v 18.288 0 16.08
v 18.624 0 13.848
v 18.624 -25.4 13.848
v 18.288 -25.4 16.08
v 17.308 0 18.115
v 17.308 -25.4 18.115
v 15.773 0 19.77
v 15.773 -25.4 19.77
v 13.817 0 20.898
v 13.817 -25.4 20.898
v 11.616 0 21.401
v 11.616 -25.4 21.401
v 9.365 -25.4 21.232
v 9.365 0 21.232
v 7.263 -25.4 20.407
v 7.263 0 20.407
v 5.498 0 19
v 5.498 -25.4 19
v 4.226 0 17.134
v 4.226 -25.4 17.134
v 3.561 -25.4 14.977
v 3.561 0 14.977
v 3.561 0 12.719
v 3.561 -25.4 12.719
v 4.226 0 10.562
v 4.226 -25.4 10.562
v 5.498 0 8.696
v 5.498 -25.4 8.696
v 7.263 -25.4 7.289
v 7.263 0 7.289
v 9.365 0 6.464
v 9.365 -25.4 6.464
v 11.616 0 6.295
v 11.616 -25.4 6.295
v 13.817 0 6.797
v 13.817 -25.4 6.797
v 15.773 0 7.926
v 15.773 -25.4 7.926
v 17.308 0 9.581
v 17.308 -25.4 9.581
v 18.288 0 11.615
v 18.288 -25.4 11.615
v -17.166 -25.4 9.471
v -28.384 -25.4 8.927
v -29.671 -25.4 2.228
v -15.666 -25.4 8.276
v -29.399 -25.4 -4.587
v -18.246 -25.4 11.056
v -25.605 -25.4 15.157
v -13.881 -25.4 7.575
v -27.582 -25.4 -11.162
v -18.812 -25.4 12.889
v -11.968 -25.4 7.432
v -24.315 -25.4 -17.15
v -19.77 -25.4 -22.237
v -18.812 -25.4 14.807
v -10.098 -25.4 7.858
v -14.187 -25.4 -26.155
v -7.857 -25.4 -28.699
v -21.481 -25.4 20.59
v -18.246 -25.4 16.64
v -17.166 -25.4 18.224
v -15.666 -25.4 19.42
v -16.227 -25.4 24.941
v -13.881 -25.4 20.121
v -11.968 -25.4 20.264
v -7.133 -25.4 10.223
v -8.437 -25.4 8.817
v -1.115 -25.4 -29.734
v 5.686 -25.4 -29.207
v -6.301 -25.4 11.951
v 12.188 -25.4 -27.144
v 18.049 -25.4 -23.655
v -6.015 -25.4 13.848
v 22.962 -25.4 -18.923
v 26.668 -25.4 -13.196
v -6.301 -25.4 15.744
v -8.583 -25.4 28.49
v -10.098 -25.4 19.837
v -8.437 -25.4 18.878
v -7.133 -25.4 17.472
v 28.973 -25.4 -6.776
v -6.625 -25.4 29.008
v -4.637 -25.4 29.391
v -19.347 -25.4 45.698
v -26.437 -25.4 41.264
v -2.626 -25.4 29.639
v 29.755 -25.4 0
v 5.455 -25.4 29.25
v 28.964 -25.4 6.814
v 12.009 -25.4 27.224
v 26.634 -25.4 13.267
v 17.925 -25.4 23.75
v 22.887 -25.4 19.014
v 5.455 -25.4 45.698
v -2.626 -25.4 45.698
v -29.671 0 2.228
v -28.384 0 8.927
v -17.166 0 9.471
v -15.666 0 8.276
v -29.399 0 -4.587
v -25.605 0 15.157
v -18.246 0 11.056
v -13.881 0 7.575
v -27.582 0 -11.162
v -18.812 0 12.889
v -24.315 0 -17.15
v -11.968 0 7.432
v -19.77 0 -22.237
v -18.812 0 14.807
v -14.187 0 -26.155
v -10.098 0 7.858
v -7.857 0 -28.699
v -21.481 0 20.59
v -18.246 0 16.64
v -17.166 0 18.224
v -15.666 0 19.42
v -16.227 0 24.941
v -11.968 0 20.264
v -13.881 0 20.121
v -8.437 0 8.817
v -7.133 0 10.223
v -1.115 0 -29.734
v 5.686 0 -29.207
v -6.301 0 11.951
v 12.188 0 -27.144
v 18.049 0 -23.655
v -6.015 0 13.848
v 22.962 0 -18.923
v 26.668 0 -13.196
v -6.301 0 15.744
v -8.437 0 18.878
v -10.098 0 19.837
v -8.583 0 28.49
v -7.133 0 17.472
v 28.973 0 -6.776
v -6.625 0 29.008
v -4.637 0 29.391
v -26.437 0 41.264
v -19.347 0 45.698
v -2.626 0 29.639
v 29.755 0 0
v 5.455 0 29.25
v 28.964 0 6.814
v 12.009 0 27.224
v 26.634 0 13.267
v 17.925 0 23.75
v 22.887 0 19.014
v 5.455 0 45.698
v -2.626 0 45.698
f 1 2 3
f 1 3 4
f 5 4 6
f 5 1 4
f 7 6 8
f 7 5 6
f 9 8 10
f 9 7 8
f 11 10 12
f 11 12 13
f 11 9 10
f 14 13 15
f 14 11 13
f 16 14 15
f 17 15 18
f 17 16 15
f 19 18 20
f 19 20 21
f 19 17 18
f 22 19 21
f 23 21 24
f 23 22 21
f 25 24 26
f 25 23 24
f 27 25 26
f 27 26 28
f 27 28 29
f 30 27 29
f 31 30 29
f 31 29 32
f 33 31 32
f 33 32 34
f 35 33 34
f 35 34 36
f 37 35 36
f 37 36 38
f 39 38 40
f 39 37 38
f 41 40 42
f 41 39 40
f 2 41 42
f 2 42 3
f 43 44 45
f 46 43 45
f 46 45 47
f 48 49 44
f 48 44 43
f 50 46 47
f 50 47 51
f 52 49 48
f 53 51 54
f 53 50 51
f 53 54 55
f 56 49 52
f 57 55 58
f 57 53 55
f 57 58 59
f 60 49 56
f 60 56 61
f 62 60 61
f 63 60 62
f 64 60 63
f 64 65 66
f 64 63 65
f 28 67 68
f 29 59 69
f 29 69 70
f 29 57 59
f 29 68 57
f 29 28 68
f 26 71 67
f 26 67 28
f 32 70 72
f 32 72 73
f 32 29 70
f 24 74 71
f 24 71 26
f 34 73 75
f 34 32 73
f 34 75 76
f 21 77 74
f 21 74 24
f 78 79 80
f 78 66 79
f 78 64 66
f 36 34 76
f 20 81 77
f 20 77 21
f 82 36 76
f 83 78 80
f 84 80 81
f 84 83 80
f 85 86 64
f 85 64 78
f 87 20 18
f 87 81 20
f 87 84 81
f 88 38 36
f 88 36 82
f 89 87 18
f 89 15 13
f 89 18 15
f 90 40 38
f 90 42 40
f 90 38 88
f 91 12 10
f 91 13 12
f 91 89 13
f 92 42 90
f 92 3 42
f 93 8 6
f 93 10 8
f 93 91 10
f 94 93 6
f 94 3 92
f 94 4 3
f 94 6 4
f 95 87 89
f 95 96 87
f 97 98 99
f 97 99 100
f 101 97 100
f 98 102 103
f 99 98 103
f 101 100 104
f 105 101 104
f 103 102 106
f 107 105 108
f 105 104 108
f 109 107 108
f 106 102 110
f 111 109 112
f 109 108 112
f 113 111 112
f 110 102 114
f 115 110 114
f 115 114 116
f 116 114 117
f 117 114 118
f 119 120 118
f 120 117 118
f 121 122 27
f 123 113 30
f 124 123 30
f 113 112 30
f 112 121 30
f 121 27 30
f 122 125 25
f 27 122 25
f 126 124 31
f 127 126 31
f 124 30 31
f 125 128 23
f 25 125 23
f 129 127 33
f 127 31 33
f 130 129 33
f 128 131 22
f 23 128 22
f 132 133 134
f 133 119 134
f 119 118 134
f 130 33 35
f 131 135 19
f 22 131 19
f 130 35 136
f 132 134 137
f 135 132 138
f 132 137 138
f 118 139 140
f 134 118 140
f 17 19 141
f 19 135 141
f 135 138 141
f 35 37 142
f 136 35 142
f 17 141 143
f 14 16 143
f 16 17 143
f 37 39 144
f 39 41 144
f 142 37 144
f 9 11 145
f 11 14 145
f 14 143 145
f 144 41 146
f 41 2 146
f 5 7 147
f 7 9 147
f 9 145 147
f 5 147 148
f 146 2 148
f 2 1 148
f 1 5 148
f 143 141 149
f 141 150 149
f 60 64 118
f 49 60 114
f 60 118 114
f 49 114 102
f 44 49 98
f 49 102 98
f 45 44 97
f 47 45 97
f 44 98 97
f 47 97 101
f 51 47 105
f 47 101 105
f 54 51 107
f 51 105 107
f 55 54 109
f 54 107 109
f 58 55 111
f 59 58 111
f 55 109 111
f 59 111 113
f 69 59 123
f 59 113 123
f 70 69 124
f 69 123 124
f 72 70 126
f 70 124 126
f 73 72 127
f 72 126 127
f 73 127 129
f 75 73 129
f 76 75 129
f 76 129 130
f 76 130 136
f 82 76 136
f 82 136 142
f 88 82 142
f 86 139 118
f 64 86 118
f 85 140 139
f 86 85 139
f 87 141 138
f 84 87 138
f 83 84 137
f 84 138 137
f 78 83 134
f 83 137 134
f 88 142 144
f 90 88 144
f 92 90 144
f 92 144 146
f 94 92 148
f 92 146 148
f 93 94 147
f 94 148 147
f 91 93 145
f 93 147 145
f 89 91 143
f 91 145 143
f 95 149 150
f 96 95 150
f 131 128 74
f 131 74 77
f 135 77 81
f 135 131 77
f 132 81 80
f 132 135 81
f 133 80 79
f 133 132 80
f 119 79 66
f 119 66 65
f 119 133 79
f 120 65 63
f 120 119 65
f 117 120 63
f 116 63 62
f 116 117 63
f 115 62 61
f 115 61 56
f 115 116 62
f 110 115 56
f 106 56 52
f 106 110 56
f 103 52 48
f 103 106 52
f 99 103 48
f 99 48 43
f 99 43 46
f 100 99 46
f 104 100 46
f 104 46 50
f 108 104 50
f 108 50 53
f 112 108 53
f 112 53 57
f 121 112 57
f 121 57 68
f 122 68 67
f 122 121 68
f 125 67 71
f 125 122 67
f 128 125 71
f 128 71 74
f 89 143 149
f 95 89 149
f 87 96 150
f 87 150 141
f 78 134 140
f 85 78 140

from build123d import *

# Parameters (mm, degrees)
F0_R     = 6.434371
F0_R_2   = 7.574086
F1_DEPTH = 25.4
F2_W     = 3.636818
F2_H     = 3.357063
F2_W_2   = 13.428252
F2_W_3   = 5.315348
F3_DEPTH = 25.4


with BuildPart() as f1:
    # F0 (on Front) → F1 (new body)
    with BuildSketch(Plane.XZ):
        with BuildLine():
            ThreePointArc((-16.227132, 24.940537), (-14.186517, -26.15517), (29.754834, 0))
            ThreePointArc((29.754834, 0), (22.887437, 19.013558), (5.455228, 29.250481))
            ThreePointArc((5.455228, 29.250481), (1.427673, 29.720564), (-2.626396, 29.638695))
            ThreePointArc((-2.626396, 29.638695), (-5.634264, 29.216524), (-8.583421, 28.489912))
            ThreePointArc((-8.583421, 28.489912), (-12.531576, 26.987215), (-16.227132, 24.940537))
        make_face()
        with Locations((-12.449108, 13.847885)):
            Circle(F0_R, mode=Mode.SUBTRACT)
        with Locations((11.050331, 13.847885)):
            Circle(F0_R_2, mode=Mode.SUBTRACT)
        with BuildLine():
            ThreePointArc((-2.626396, 29.638695), (1.427673, 29.720564), (5.455228, 29.250481))
            Line((5.455228, 29.250481), (5.455228, 45.698488))
            Line((5.455228, 45.698488), (-2.626396, 45.698488))
            Line((-2.626396, 45.698488), (-2.626396, 29.638695))
        make_face()
        with BuildLine():
            Line((-26.436771, 41.263932), (-16.227132, 24.940537))
            ThreePointArc((-16.227132, 24.940537), (-12.531576, 26.987215), (-8.583421, 28.489912))
            Line((-8.583421, 28.489912), (-19.346706, 45.698488))
            Line((-19.346706, 45.698488), (-26.436771, 41.263932))
        make_face()
    extrude(amount=F1_DEPTH)

    # F2 (on Front) → F3 (join)
    with BuildSketch(Plane.XZ):
        with Locations((-8.112902, -10.770577)):
            Rectangle(F2_W, F2_H)
        with Locations((0.419633, -10.770577)):
            Rectangle(F2_W_2, F2_H)
        with Locations((9.791433, -10.770577)):
            Rectangle(F2_W_3, F2_H)
        Polygon((0, 0), (0, 11.609843), (-7.13376, 0), align=None)
    extrude(amount=F3_DEPTH)


solid = f1.part
